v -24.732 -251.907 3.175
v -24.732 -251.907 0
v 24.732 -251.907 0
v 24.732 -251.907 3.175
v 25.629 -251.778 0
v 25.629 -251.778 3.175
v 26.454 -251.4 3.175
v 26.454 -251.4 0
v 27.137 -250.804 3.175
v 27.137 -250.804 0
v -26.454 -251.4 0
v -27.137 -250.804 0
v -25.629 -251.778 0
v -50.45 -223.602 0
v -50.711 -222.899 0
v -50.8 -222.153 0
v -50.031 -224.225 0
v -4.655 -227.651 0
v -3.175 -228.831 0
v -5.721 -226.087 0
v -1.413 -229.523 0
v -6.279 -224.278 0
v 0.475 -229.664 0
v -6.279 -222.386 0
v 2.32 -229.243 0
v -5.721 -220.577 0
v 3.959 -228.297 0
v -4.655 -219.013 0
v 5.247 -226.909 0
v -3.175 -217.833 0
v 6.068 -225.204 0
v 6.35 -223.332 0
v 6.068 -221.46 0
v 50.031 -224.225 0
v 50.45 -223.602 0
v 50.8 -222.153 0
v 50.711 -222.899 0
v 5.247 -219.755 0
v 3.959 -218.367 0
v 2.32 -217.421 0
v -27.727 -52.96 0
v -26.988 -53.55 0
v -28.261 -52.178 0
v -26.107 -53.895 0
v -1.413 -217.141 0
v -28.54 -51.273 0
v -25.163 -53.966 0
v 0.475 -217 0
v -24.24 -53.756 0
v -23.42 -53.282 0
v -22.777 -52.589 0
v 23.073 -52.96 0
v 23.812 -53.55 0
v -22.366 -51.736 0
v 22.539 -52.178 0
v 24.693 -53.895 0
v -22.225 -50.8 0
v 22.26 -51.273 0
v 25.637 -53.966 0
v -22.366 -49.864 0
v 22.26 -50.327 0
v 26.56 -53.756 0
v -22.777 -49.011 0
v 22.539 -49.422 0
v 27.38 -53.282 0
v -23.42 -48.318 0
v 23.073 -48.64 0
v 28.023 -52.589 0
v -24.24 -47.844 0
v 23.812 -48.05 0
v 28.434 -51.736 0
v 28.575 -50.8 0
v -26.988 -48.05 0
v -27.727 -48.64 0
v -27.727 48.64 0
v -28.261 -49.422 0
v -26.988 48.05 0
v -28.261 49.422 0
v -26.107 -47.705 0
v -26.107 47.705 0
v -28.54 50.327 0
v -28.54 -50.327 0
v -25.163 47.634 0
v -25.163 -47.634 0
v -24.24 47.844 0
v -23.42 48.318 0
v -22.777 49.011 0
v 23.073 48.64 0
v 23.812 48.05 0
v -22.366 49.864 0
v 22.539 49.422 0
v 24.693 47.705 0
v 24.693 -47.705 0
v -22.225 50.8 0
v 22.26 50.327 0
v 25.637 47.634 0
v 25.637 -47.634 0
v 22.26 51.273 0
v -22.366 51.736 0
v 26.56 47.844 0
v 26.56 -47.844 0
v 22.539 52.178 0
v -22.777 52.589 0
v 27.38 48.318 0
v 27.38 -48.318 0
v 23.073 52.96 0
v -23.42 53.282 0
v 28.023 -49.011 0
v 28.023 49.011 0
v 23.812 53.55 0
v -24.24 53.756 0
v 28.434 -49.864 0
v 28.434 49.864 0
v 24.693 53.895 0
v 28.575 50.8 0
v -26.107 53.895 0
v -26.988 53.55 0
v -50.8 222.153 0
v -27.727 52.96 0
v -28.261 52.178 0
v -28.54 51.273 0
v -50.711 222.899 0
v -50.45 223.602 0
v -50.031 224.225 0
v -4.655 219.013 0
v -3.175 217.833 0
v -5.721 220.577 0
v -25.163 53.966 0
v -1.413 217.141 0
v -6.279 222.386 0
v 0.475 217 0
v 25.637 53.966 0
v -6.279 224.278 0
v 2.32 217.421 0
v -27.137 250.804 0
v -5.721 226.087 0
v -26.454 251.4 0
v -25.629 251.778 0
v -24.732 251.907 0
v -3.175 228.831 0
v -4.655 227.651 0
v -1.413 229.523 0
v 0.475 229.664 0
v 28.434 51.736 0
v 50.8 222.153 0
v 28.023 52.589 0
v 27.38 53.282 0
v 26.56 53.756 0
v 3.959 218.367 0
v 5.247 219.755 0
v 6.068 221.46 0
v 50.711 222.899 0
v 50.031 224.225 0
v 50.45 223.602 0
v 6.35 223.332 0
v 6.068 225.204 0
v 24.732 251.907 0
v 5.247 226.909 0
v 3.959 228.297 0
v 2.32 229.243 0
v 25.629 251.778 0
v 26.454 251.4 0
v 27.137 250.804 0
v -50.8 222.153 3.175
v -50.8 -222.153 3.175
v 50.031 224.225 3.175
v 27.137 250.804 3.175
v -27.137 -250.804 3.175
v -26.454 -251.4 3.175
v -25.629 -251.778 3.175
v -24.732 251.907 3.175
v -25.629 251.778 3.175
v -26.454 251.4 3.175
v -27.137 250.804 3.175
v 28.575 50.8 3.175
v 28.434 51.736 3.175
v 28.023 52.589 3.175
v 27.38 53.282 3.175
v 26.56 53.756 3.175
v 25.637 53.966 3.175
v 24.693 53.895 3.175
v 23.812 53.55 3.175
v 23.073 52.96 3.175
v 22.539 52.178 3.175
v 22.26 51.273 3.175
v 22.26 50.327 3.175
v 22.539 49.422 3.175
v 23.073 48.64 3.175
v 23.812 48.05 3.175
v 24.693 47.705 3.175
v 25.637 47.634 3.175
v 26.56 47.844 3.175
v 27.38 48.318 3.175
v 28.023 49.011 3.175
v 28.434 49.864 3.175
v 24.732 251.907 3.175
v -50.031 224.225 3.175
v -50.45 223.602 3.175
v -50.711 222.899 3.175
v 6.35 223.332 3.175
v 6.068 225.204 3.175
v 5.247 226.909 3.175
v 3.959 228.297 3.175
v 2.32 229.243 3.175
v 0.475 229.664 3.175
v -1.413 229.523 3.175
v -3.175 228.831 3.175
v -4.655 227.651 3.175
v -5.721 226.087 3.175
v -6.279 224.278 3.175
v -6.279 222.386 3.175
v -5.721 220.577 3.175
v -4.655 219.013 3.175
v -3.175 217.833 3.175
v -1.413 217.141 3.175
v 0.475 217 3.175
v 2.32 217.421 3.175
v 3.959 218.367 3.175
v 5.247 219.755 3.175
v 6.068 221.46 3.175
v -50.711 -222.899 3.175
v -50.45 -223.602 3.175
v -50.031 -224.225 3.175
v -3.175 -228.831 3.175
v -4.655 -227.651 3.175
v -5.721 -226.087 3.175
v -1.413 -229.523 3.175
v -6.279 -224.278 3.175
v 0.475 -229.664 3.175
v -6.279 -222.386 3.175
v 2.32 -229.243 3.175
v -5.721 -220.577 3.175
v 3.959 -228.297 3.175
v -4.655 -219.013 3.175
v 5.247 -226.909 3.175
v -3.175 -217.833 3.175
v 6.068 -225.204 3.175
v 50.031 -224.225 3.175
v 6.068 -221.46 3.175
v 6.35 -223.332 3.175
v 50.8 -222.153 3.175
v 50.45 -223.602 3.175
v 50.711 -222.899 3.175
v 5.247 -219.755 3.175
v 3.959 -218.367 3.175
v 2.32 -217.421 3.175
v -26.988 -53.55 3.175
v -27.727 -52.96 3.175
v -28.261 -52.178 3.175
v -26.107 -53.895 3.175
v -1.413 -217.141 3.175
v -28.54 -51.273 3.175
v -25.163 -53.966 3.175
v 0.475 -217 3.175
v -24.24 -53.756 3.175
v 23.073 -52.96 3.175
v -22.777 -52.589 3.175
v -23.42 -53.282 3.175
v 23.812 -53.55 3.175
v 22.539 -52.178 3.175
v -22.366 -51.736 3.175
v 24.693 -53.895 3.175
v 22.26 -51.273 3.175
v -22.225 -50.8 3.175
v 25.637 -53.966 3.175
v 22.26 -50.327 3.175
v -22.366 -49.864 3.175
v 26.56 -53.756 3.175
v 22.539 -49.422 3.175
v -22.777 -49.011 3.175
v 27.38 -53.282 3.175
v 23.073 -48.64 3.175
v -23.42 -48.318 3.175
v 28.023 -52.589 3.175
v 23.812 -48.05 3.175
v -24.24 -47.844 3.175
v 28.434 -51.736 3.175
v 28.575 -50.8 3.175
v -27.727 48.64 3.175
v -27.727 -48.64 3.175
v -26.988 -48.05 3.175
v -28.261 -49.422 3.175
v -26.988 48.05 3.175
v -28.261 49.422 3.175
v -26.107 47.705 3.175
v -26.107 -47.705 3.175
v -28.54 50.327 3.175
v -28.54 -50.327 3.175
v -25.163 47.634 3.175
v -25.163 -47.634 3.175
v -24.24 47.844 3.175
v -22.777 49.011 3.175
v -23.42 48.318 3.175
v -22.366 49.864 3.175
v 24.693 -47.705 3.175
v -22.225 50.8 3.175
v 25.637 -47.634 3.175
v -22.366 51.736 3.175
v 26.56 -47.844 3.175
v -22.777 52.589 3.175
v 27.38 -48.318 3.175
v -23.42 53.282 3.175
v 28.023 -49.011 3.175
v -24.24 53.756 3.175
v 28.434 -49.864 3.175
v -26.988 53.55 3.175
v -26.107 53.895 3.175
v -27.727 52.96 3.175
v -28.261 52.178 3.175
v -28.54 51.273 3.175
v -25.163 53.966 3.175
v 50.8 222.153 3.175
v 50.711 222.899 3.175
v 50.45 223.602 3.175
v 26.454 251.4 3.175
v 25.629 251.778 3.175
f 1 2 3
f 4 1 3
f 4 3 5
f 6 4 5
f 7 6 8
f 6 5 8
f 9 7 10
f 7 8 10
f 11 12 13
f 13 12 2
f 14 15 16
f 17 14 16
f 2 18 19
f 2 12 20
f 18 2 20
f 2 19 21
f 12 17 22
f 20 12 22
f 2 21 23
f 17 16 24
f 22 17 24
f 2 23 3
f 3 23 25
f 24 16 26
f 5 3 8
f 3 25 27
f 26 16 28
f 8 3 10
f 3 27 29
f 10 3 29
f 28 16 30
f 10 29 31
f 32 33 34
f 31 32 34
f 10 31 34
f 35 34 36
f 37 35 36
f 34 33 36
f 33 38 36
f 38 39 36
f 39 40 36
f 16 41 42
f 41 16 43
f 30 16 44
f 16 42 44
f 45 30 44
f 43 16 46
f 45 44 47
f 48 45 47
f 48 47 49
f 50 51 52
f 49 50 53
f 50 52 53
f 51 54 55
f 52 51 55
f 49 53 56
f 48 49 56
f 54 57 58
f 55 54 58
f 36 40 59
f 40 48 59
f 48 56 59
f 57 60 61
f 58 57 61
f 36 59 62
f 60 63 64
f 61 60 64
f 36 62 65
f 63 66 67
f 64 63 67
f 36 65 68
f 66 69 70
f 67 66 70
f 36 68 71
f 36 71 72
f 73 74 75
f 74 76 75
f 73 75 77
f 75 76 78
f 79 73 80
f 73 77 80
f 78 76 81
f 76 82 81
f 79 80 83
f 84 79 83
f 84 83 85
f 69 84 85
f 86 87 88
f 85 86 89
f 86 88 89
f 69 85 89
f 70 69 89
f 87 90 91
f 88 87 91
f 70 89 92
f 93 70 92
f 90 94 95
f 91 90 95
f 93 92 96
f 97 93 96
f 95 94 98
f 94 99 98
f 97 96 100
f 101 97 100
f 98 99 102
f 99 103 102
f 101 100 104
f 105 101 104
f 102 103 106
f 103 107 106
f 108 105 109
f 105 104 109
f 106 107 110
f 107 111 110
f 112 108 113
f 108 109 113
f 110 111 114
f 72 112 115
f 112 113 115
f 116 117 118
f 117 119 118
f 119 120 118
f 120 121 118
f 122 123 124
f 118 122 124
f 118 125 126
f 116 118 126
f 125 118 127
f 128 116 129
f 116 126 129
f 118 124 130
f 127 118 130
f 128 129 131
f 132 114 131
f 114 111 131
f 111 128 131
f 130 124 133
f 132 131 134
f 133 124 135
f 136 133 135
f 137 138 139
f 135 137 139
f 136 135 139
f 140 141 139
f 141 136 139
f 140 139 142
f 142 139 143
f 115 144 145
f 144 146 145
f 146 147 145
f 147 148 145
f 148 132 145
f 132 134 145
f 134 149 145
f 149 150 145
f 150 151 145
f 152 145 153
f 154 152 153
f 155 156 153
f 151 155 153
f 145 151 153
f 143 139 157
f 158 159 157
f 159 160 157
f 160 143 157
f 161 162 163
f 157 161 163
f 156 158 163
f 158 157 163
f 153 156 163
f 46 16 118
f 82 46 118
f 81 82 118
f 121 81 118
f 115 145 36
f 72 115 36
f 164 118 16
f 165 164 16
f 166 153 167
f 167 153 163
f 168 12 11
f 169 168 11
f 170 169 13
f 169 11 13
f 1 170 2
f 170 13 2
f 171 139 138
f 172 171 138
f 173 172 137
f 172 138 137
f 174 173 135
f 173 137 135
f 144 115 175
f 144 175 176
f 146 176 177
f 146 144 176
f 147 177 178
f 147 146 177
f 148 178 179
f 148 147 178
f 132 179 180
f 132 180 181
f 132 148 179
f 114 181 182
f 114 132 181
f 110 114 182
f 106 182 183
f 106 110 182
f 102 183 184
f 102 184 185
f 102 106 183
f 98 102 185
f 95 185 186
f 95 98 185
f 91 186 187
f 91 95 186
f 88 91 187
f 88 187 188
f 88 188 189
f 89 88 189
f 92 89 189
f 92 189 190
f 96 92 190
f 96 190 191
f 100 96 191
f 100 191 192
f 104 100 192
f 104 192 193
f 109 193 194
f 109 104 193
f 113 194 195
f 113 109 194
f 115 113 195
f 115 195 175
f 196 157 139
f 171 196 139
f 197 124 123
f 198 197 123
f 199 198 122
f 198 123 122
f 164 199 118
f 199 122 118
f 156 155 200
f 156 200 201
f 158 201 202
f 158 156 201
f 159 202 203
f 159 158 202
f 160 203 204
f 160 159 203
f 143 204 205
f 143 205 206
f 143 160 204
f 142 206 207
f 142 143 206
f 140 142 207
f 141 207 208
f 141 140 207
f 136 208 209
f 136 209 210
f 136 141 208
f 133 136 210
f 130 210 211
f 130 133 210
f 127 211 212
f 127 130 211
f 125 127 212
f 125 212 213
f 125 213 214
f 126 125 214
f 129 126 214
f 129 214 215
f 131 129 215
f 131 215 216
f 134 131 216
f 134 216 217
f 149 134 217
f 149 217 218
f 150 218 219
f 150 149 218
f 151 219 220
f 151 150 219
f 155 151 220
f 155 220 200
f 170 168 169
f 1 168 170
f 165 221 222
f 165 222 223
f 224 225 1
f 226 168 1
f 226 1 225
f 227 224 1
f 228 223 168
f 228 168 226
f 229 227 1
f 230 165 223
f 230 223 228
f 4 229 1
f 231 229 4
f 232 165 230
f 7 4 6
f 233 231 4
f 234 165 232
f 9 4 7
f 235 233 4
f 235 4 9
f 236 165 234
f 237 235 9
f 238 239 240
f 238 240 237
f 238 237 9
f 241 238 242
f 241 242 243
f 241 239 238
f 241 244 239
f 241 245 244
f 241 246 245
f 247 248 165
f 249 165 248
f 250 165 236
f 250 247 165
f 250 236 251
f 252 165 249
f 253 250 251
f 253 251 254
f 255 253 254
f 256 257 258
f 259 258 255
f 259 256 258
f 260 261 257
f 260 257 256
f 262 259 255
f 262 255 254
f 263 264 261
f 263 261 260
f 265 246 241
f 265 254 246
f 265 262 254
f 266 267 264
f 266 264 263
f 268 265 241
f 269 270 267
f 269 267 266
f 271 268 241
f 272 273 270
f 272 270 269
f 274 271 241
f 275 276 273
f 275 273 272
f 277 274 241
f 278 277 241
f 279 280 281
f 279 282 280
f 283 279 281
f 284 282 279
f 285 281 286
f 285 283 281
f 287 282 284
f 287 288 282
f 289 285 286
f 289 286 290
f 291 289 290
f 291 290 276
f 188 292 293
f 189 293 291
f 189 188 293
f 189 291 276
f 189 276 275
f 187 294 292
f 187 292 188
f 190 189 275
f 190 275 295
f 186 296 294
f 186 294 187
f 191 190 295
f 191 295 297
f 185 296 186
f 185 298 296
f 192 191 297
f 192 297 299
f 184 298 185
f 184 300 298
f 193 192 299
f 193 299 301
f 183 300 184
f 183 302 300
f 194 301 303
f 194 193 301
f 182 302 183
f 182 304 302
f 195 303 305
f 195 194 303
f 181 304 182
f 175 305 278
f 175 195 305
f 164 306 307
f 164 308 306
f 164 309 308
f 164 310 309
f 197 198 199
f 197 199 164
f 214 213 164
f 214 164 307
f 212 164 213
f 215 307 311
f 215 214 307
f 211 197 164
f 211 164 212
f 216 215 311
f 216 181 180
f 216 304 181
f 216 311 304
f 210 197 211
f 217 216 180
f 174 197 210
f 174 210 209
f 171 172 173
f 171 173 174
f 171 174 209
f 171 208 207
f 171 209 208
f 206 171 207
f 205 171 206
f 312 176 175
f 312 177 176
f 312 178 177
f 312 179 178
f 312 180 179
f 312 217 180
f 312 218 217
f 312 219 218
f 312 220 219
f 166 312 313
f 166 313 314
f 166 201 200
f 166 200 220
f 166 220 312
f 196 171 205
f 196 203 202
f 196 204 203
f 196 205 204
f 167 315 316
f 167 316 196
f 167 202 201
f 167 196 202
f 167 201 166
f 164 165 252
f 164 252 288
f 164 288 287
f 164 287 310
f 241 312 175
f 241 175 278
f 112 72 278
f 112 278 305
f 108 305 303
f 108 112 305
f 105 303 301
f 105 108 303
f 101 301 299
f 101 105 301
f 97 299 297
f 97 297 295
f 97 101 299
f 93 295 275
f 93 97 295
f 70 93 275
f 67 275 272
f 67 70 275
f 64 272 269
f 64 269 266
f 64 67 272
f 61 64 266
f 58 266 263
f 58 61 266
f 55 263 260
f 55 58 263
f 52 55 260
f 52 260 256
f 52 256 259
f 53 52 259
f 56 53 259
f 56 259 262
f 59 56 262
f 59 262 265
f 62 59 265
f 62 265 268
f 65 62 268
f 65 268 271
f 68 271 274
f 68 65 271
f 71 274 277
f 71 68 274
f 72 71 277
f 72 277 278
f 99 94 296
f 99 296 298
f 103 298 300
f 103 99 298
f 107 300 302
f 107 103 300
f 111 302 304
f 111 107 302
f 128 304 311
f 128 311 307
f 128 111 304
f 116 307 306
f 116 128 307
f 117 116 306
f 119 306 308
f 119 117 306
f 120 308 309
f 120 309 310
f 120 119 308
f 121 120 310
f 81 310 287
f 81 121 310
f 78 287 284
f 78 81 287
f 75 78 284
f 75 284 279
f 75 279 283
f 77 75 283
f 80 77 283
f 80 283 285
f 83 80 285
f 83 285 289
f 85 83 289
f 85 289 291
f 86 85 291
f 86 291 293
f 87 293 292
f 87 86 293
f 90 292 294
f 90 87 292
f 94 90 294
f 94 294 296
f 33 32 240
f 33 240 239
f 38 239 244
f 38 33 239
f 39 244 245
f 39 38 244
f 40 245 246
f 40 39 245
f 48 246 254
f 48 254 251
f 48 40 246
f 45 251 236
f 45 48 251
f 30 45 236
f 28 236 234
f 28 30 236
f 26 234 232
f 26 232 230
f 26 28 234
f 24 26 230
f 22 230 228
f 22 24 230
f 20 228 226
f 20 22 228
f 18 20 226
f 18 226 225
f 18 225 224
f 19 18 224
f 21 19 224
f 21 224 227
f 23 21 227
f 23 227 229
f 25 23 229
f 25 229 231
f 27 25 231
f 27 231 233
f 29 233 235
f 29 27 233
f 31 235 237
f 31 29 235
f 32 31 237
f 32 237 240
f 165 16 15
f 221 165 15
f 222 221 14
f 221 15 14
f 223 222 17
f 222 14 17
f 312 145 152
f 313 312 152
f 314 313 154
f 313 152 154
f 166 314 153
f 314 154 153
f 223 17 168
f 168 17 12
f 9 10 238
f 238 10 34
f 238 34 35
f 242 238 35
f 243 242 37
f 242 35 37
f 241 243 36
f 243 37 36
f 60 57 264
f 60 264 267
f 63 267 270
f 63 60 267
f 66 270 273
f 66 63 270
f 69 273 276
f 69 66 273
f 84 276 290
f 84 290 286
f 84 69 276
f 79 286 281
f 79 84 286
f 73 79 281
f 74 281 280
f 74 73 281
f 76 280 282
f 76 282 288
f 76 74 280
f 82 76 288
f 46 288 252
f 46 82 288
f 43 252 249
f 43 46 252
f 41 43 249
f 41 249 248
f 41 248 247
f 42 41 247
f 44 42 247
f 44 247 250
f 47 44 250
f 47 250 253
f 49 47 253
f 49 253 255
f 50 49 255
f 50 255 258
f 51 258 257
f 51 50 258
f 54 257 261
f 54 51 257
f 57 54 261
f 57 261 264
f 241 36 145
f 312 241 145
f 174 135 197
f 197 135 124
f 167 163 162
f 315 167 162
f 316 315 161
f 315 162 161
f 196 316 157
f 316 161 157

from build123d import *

# Parameters (mm, degrees)
F0_R     = 6.35
F0_R_2   = 3.175
F1_DEPTH = 3.175


with BuildPart() as f1:
    # F0 (on Top) → F1 (new body)
    with BuildSketch(Plane.XY):
        with BuildLine():
            Line((-50.8, 222.153178), (-50.8, 0))
            Line((-50.8, 0), (-50.8, -222.153178))
            ThreePointArc((-50.8, -222.153178), (-50.601455, -223.258321), (-50.030652, -224.225246))
            Line((-50.030652, -224.225246), (-27.137392, -250.804108))
            ThreePointArc((-27.137392, -250.804108), (-26.054958, -251.618165), (-24.731741, -251.90704))
            Line((-24.731741, -251.90704), (24.731741, -251.90704))
            ThreePointArc((24.731741, -251.90704), (26.054958, -251.618165), (27.137392, -250.804108))
            Line((27.137392, -250.804108), (50.030652, -224.225246))
            ThreePointArc((50.030652, -224.225246), (50.601455, -223.258321), (50.8, -222.153178))
            Line((50.8, -222.153178), (50.8, 0))
            Line((50.8, 0), (50.8, 222.153178))
            ThreePointArc((50.8, 222.153178), (50.601455, 223.258321), (50.030652, 224.225246))
            Line((50.030652, 224.225246), (27.137392, 250.804108))
            ThreePointArc((27.137392, 250.804108), (26.054958, 251.618165), (24.731741, 251.90704))
            Line((24.731741, 251.90704), (-24.731741, 251.90704))
            ThreePointArc((-24.731741, 251.90704), (-26.054958, 251.618165), (-27.137392, 250.804108))
            Line((-27.137392, 250.804108), (-50.030652, 224.225246))
            ThreePointArc((-50.030652, 224.225246), (-50.601455, 223.258321), (-50.8, 222.153178))
        make_face()
        with Locations((0, -223.33204)):
            Circle(F0_R, mode=Mode.SUBTRACT)
        with Locations((-25.4, -50.8)):
            Circle(F0_R_2, mode=Mode.SUBTRACT)
        with Locations((25.4, -50.8)):
            Circle(F0_R_2, mode=Mode.SUBTRACT)
        with Locations((-25.4, 50.8)):
            Circle(F0_R_2, mode=Mode.SUBTRACT)
        with Locations((0, 223.33204)):
            Circle(F0_R, mode=Mode.SUBTRACT)
        with Locations((25.4, 50.8)):
            Circle(F0_R_2, mode=Mode.SUBTRACT)
    extrude(amount=F1_DEPTH)


solid = f1.part
